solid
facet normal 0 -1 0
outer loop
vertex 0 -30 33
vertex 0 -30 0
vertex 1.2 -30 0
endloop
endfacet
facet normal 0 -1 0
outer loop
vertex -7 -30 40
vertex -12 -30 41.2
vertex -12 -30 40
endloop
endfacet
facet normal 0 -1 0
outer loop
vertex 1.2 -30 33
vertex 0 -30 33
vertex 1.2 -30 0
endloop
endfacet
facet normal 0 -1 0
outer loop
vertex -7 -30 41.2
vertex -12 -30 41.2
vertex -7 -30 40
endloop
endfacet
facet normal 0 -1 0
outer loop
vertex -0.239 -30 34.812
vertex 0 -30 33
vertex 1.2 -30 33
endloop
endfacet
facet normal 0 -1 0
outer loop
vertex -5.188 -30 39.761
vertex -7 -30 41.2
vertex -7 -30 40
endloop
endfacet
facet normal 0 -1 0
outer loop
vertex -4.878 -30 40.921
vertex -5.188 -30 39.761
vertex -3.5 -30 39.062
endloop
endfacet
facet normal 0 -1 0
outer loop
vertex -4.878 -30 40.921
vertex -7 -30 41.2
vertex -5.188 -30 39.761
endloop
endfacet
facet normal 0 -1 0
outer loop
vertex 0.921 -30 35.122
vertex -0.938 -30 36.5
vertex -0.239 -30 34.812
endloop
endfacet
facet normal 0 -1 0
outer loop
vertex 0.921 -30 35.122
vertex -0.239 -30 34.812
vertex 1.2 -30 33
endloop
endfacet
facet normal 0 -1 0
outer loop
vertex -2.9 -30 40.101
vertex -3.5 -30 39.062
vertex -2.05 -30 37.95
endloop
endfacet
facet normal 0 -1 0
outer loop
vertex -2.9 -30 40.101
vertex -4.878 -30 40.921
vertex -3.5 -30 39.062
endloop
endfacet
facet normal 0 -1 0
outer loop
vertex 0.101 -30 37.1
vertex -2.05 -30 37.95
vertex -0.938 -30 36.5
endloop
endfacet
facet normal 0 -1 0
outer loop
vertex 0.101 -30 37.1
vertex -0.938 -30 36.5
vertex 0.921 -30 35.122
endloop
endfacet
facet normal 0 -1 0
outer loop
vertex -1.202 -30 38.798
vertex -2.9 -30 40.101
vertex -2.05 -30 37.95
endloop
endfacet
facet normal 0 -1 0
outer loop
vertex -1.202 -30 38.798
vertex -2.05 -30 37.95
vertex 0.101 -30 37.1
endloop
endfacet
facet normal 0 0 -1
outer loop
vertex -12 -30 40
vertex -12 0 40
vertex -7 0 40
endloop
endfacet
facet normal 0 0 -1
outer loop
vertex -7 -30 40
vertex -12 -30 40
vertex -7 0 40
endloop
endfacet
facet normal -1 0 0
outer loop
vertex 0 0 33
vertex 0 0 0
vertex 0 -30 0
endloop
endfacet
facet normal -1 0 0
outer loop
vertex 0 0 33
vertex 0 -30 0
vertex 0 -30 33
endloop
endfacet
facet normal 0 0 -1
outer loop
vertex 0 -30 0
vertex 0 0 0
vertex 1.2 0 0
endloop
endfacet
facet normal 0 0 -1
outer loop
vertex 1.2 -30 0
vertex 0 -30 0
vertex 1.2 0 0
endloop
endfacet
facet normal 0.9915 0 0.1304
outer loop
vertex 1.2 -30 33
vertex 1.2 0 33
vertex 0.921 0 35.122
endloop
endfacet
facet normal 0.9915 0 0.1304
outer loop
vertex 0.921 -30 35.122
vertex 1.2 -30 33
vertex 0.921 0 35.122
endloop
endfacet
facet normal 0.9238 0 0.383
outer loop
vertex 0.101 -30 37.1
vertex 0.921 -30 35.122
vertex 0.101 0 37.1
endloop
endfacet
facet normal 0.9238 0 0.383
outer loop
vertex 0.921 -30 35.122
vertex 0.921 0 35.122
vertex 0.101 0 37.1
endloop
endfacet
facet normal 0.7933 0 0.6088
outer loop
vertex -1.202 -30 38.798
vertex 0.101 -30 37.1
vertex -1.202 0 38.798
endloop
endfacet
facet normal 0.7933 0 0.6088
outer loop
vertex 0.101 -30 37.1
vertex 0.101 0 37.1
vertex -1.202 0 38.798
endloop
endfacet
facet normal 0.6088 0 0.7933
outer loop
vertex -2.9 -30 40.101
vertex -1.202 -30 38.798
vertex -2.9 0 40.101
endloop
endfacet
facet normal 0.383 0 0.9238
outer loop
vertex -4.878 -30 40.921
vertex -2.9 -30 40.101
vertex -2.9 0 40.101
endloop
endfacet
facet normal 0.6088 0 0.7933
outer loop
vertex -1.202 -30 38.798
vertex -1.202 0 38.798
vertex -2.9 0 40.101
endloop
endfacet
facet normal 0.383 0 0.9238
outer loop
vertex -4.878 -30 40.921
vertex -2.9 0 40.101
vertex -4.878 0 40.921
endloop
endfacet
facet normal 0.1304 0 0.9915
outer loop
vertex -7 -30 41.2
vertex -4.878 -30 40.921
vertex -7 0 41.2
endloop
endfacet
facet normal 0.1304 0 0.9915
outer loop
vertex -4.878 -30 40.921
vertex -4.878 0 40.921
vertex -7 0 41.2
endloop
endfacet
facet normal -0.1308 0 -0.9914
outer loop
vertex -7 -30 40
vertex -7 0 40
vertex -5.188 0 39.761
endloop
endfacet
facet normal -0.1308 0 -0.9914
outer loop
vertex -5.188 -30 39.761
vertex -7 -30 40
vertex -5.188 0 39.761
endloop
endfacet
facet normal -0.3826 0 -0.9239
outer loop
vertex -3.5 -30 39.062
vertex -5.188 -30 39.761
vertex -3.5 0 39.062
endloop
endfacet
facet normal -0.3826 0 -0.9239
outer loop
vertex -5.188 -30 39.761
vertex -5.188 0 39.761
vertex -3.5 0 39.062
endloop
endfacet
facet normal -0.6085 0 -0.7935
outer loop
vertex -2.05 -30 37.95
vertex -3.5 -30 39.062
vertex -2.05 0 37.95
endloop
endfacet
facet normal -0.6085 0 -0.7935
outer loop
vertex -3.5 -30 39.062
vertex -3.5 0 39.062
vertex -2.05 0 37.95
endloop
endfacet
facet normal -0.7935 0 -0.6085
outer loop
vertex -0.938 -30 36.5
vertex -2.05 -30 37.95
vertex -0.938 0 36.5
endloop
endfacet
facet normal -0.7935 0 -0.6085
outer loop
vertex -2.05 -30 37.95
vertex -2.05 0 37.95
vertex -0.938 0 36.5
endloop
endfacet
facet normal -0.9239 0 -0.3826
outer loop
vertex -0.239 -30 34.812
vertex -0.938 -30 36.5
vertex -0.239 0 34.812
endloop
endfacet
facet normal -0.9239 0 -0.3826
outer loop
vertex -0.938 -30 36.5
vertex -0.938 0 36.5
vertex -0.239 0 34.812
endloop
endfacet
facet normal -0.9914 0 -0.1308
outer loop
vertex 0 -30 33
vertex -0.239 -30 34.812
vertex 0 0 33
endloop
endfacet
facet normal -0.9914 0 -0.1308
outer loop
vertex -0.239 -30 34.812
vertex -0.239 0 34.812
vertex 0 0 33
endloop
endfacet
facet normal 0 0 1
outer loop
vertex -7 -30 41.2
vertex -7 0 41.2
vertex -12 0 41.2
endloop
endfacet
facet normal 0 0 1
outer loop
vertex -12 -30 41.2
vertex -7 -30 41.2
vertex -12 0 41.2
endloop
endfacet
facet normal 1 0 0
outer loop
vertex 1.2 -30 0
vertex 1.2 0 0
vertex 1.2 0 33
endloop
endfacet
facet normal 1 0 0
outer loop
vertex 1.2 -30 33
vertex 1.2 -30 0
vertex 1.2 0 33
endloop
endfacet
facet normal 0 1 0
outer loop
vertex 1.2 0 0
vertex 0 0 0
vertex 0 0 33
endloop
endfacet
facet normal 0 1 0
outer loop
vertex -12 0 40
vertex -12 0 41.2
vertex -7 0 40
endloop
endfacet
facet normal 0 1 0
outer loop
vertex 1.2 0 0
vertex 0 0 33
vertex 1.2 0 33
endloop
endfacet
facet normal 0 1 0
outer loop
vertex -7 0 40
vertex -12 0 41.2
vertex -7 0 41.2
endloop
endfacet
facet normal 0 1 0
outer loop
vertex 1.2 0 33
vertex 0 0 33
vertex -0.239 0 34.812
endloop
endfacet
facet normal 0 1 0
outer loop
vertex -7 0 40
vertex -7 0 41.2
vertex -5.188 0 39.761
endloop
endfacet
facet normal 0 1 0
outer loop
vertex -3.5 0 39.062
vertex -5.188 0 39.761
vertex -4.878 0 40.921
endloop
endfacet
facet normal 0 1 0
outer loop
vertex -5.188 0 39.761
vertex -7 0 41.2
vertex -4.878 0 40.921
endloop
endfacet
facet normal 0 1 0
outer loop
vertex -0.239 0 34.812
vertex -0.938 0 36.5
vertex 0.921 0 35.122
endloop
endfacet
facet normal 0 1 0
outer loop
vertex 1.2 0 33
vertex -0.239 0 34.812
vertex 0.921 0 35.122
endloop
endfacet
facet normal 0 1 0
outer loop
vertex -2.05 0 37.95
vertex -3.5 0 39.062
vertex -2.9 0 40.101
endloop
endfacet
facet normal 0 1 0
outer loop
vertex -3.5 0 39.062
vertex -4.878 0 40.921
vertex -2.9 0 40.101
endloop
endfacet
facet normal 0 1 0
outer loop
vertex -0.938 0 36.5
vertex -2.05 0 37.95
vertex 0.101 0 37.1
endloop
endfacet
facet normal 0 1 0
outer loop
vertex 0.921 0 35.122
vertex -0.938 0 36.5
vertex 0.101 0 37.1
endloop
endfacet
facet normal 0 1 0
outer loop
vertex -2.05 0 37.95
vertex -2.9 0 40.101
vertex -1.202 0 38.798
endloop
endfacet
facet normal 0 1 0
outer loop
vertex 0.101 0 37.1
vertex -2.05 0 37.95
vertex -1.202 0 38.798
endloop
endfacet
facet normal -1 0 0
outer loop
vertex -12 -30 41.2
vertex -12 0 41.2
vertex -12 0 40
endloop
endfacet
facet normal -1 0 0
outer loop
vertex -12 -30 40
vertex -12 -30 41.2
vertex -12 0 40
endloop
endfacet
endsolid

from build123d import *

# Parameters (mm, degrees)
F0_W     = 1.2
F0_H     = 33
F1_DEPTH = 30


with BuildPart() as f1:
    # F0 (on Front) → F1 (new body)
    with BuildSketch(Plane.XZ):
        with Locations((0.6, 16.5)):
            Rectangle(F0_W, F0_H)
        with BuildLine():
            ThreePointArc((-7, 40), (-2.050253, 37.949747), (0, 33))
            Line((0, 33), (1.2, 33))
            ThreePointArc((1.2, 33), (-1.201724, 38.798276), (-7, 41.2))
            Line((-7, 41.2), (-12, 41.2))
            Line((-12, 41.2), (-12, 40))
            Line((-12, 40), (-7, 40))
        make_face()
    extrude(amount=F1_DEPTH)


solid = f1.part
